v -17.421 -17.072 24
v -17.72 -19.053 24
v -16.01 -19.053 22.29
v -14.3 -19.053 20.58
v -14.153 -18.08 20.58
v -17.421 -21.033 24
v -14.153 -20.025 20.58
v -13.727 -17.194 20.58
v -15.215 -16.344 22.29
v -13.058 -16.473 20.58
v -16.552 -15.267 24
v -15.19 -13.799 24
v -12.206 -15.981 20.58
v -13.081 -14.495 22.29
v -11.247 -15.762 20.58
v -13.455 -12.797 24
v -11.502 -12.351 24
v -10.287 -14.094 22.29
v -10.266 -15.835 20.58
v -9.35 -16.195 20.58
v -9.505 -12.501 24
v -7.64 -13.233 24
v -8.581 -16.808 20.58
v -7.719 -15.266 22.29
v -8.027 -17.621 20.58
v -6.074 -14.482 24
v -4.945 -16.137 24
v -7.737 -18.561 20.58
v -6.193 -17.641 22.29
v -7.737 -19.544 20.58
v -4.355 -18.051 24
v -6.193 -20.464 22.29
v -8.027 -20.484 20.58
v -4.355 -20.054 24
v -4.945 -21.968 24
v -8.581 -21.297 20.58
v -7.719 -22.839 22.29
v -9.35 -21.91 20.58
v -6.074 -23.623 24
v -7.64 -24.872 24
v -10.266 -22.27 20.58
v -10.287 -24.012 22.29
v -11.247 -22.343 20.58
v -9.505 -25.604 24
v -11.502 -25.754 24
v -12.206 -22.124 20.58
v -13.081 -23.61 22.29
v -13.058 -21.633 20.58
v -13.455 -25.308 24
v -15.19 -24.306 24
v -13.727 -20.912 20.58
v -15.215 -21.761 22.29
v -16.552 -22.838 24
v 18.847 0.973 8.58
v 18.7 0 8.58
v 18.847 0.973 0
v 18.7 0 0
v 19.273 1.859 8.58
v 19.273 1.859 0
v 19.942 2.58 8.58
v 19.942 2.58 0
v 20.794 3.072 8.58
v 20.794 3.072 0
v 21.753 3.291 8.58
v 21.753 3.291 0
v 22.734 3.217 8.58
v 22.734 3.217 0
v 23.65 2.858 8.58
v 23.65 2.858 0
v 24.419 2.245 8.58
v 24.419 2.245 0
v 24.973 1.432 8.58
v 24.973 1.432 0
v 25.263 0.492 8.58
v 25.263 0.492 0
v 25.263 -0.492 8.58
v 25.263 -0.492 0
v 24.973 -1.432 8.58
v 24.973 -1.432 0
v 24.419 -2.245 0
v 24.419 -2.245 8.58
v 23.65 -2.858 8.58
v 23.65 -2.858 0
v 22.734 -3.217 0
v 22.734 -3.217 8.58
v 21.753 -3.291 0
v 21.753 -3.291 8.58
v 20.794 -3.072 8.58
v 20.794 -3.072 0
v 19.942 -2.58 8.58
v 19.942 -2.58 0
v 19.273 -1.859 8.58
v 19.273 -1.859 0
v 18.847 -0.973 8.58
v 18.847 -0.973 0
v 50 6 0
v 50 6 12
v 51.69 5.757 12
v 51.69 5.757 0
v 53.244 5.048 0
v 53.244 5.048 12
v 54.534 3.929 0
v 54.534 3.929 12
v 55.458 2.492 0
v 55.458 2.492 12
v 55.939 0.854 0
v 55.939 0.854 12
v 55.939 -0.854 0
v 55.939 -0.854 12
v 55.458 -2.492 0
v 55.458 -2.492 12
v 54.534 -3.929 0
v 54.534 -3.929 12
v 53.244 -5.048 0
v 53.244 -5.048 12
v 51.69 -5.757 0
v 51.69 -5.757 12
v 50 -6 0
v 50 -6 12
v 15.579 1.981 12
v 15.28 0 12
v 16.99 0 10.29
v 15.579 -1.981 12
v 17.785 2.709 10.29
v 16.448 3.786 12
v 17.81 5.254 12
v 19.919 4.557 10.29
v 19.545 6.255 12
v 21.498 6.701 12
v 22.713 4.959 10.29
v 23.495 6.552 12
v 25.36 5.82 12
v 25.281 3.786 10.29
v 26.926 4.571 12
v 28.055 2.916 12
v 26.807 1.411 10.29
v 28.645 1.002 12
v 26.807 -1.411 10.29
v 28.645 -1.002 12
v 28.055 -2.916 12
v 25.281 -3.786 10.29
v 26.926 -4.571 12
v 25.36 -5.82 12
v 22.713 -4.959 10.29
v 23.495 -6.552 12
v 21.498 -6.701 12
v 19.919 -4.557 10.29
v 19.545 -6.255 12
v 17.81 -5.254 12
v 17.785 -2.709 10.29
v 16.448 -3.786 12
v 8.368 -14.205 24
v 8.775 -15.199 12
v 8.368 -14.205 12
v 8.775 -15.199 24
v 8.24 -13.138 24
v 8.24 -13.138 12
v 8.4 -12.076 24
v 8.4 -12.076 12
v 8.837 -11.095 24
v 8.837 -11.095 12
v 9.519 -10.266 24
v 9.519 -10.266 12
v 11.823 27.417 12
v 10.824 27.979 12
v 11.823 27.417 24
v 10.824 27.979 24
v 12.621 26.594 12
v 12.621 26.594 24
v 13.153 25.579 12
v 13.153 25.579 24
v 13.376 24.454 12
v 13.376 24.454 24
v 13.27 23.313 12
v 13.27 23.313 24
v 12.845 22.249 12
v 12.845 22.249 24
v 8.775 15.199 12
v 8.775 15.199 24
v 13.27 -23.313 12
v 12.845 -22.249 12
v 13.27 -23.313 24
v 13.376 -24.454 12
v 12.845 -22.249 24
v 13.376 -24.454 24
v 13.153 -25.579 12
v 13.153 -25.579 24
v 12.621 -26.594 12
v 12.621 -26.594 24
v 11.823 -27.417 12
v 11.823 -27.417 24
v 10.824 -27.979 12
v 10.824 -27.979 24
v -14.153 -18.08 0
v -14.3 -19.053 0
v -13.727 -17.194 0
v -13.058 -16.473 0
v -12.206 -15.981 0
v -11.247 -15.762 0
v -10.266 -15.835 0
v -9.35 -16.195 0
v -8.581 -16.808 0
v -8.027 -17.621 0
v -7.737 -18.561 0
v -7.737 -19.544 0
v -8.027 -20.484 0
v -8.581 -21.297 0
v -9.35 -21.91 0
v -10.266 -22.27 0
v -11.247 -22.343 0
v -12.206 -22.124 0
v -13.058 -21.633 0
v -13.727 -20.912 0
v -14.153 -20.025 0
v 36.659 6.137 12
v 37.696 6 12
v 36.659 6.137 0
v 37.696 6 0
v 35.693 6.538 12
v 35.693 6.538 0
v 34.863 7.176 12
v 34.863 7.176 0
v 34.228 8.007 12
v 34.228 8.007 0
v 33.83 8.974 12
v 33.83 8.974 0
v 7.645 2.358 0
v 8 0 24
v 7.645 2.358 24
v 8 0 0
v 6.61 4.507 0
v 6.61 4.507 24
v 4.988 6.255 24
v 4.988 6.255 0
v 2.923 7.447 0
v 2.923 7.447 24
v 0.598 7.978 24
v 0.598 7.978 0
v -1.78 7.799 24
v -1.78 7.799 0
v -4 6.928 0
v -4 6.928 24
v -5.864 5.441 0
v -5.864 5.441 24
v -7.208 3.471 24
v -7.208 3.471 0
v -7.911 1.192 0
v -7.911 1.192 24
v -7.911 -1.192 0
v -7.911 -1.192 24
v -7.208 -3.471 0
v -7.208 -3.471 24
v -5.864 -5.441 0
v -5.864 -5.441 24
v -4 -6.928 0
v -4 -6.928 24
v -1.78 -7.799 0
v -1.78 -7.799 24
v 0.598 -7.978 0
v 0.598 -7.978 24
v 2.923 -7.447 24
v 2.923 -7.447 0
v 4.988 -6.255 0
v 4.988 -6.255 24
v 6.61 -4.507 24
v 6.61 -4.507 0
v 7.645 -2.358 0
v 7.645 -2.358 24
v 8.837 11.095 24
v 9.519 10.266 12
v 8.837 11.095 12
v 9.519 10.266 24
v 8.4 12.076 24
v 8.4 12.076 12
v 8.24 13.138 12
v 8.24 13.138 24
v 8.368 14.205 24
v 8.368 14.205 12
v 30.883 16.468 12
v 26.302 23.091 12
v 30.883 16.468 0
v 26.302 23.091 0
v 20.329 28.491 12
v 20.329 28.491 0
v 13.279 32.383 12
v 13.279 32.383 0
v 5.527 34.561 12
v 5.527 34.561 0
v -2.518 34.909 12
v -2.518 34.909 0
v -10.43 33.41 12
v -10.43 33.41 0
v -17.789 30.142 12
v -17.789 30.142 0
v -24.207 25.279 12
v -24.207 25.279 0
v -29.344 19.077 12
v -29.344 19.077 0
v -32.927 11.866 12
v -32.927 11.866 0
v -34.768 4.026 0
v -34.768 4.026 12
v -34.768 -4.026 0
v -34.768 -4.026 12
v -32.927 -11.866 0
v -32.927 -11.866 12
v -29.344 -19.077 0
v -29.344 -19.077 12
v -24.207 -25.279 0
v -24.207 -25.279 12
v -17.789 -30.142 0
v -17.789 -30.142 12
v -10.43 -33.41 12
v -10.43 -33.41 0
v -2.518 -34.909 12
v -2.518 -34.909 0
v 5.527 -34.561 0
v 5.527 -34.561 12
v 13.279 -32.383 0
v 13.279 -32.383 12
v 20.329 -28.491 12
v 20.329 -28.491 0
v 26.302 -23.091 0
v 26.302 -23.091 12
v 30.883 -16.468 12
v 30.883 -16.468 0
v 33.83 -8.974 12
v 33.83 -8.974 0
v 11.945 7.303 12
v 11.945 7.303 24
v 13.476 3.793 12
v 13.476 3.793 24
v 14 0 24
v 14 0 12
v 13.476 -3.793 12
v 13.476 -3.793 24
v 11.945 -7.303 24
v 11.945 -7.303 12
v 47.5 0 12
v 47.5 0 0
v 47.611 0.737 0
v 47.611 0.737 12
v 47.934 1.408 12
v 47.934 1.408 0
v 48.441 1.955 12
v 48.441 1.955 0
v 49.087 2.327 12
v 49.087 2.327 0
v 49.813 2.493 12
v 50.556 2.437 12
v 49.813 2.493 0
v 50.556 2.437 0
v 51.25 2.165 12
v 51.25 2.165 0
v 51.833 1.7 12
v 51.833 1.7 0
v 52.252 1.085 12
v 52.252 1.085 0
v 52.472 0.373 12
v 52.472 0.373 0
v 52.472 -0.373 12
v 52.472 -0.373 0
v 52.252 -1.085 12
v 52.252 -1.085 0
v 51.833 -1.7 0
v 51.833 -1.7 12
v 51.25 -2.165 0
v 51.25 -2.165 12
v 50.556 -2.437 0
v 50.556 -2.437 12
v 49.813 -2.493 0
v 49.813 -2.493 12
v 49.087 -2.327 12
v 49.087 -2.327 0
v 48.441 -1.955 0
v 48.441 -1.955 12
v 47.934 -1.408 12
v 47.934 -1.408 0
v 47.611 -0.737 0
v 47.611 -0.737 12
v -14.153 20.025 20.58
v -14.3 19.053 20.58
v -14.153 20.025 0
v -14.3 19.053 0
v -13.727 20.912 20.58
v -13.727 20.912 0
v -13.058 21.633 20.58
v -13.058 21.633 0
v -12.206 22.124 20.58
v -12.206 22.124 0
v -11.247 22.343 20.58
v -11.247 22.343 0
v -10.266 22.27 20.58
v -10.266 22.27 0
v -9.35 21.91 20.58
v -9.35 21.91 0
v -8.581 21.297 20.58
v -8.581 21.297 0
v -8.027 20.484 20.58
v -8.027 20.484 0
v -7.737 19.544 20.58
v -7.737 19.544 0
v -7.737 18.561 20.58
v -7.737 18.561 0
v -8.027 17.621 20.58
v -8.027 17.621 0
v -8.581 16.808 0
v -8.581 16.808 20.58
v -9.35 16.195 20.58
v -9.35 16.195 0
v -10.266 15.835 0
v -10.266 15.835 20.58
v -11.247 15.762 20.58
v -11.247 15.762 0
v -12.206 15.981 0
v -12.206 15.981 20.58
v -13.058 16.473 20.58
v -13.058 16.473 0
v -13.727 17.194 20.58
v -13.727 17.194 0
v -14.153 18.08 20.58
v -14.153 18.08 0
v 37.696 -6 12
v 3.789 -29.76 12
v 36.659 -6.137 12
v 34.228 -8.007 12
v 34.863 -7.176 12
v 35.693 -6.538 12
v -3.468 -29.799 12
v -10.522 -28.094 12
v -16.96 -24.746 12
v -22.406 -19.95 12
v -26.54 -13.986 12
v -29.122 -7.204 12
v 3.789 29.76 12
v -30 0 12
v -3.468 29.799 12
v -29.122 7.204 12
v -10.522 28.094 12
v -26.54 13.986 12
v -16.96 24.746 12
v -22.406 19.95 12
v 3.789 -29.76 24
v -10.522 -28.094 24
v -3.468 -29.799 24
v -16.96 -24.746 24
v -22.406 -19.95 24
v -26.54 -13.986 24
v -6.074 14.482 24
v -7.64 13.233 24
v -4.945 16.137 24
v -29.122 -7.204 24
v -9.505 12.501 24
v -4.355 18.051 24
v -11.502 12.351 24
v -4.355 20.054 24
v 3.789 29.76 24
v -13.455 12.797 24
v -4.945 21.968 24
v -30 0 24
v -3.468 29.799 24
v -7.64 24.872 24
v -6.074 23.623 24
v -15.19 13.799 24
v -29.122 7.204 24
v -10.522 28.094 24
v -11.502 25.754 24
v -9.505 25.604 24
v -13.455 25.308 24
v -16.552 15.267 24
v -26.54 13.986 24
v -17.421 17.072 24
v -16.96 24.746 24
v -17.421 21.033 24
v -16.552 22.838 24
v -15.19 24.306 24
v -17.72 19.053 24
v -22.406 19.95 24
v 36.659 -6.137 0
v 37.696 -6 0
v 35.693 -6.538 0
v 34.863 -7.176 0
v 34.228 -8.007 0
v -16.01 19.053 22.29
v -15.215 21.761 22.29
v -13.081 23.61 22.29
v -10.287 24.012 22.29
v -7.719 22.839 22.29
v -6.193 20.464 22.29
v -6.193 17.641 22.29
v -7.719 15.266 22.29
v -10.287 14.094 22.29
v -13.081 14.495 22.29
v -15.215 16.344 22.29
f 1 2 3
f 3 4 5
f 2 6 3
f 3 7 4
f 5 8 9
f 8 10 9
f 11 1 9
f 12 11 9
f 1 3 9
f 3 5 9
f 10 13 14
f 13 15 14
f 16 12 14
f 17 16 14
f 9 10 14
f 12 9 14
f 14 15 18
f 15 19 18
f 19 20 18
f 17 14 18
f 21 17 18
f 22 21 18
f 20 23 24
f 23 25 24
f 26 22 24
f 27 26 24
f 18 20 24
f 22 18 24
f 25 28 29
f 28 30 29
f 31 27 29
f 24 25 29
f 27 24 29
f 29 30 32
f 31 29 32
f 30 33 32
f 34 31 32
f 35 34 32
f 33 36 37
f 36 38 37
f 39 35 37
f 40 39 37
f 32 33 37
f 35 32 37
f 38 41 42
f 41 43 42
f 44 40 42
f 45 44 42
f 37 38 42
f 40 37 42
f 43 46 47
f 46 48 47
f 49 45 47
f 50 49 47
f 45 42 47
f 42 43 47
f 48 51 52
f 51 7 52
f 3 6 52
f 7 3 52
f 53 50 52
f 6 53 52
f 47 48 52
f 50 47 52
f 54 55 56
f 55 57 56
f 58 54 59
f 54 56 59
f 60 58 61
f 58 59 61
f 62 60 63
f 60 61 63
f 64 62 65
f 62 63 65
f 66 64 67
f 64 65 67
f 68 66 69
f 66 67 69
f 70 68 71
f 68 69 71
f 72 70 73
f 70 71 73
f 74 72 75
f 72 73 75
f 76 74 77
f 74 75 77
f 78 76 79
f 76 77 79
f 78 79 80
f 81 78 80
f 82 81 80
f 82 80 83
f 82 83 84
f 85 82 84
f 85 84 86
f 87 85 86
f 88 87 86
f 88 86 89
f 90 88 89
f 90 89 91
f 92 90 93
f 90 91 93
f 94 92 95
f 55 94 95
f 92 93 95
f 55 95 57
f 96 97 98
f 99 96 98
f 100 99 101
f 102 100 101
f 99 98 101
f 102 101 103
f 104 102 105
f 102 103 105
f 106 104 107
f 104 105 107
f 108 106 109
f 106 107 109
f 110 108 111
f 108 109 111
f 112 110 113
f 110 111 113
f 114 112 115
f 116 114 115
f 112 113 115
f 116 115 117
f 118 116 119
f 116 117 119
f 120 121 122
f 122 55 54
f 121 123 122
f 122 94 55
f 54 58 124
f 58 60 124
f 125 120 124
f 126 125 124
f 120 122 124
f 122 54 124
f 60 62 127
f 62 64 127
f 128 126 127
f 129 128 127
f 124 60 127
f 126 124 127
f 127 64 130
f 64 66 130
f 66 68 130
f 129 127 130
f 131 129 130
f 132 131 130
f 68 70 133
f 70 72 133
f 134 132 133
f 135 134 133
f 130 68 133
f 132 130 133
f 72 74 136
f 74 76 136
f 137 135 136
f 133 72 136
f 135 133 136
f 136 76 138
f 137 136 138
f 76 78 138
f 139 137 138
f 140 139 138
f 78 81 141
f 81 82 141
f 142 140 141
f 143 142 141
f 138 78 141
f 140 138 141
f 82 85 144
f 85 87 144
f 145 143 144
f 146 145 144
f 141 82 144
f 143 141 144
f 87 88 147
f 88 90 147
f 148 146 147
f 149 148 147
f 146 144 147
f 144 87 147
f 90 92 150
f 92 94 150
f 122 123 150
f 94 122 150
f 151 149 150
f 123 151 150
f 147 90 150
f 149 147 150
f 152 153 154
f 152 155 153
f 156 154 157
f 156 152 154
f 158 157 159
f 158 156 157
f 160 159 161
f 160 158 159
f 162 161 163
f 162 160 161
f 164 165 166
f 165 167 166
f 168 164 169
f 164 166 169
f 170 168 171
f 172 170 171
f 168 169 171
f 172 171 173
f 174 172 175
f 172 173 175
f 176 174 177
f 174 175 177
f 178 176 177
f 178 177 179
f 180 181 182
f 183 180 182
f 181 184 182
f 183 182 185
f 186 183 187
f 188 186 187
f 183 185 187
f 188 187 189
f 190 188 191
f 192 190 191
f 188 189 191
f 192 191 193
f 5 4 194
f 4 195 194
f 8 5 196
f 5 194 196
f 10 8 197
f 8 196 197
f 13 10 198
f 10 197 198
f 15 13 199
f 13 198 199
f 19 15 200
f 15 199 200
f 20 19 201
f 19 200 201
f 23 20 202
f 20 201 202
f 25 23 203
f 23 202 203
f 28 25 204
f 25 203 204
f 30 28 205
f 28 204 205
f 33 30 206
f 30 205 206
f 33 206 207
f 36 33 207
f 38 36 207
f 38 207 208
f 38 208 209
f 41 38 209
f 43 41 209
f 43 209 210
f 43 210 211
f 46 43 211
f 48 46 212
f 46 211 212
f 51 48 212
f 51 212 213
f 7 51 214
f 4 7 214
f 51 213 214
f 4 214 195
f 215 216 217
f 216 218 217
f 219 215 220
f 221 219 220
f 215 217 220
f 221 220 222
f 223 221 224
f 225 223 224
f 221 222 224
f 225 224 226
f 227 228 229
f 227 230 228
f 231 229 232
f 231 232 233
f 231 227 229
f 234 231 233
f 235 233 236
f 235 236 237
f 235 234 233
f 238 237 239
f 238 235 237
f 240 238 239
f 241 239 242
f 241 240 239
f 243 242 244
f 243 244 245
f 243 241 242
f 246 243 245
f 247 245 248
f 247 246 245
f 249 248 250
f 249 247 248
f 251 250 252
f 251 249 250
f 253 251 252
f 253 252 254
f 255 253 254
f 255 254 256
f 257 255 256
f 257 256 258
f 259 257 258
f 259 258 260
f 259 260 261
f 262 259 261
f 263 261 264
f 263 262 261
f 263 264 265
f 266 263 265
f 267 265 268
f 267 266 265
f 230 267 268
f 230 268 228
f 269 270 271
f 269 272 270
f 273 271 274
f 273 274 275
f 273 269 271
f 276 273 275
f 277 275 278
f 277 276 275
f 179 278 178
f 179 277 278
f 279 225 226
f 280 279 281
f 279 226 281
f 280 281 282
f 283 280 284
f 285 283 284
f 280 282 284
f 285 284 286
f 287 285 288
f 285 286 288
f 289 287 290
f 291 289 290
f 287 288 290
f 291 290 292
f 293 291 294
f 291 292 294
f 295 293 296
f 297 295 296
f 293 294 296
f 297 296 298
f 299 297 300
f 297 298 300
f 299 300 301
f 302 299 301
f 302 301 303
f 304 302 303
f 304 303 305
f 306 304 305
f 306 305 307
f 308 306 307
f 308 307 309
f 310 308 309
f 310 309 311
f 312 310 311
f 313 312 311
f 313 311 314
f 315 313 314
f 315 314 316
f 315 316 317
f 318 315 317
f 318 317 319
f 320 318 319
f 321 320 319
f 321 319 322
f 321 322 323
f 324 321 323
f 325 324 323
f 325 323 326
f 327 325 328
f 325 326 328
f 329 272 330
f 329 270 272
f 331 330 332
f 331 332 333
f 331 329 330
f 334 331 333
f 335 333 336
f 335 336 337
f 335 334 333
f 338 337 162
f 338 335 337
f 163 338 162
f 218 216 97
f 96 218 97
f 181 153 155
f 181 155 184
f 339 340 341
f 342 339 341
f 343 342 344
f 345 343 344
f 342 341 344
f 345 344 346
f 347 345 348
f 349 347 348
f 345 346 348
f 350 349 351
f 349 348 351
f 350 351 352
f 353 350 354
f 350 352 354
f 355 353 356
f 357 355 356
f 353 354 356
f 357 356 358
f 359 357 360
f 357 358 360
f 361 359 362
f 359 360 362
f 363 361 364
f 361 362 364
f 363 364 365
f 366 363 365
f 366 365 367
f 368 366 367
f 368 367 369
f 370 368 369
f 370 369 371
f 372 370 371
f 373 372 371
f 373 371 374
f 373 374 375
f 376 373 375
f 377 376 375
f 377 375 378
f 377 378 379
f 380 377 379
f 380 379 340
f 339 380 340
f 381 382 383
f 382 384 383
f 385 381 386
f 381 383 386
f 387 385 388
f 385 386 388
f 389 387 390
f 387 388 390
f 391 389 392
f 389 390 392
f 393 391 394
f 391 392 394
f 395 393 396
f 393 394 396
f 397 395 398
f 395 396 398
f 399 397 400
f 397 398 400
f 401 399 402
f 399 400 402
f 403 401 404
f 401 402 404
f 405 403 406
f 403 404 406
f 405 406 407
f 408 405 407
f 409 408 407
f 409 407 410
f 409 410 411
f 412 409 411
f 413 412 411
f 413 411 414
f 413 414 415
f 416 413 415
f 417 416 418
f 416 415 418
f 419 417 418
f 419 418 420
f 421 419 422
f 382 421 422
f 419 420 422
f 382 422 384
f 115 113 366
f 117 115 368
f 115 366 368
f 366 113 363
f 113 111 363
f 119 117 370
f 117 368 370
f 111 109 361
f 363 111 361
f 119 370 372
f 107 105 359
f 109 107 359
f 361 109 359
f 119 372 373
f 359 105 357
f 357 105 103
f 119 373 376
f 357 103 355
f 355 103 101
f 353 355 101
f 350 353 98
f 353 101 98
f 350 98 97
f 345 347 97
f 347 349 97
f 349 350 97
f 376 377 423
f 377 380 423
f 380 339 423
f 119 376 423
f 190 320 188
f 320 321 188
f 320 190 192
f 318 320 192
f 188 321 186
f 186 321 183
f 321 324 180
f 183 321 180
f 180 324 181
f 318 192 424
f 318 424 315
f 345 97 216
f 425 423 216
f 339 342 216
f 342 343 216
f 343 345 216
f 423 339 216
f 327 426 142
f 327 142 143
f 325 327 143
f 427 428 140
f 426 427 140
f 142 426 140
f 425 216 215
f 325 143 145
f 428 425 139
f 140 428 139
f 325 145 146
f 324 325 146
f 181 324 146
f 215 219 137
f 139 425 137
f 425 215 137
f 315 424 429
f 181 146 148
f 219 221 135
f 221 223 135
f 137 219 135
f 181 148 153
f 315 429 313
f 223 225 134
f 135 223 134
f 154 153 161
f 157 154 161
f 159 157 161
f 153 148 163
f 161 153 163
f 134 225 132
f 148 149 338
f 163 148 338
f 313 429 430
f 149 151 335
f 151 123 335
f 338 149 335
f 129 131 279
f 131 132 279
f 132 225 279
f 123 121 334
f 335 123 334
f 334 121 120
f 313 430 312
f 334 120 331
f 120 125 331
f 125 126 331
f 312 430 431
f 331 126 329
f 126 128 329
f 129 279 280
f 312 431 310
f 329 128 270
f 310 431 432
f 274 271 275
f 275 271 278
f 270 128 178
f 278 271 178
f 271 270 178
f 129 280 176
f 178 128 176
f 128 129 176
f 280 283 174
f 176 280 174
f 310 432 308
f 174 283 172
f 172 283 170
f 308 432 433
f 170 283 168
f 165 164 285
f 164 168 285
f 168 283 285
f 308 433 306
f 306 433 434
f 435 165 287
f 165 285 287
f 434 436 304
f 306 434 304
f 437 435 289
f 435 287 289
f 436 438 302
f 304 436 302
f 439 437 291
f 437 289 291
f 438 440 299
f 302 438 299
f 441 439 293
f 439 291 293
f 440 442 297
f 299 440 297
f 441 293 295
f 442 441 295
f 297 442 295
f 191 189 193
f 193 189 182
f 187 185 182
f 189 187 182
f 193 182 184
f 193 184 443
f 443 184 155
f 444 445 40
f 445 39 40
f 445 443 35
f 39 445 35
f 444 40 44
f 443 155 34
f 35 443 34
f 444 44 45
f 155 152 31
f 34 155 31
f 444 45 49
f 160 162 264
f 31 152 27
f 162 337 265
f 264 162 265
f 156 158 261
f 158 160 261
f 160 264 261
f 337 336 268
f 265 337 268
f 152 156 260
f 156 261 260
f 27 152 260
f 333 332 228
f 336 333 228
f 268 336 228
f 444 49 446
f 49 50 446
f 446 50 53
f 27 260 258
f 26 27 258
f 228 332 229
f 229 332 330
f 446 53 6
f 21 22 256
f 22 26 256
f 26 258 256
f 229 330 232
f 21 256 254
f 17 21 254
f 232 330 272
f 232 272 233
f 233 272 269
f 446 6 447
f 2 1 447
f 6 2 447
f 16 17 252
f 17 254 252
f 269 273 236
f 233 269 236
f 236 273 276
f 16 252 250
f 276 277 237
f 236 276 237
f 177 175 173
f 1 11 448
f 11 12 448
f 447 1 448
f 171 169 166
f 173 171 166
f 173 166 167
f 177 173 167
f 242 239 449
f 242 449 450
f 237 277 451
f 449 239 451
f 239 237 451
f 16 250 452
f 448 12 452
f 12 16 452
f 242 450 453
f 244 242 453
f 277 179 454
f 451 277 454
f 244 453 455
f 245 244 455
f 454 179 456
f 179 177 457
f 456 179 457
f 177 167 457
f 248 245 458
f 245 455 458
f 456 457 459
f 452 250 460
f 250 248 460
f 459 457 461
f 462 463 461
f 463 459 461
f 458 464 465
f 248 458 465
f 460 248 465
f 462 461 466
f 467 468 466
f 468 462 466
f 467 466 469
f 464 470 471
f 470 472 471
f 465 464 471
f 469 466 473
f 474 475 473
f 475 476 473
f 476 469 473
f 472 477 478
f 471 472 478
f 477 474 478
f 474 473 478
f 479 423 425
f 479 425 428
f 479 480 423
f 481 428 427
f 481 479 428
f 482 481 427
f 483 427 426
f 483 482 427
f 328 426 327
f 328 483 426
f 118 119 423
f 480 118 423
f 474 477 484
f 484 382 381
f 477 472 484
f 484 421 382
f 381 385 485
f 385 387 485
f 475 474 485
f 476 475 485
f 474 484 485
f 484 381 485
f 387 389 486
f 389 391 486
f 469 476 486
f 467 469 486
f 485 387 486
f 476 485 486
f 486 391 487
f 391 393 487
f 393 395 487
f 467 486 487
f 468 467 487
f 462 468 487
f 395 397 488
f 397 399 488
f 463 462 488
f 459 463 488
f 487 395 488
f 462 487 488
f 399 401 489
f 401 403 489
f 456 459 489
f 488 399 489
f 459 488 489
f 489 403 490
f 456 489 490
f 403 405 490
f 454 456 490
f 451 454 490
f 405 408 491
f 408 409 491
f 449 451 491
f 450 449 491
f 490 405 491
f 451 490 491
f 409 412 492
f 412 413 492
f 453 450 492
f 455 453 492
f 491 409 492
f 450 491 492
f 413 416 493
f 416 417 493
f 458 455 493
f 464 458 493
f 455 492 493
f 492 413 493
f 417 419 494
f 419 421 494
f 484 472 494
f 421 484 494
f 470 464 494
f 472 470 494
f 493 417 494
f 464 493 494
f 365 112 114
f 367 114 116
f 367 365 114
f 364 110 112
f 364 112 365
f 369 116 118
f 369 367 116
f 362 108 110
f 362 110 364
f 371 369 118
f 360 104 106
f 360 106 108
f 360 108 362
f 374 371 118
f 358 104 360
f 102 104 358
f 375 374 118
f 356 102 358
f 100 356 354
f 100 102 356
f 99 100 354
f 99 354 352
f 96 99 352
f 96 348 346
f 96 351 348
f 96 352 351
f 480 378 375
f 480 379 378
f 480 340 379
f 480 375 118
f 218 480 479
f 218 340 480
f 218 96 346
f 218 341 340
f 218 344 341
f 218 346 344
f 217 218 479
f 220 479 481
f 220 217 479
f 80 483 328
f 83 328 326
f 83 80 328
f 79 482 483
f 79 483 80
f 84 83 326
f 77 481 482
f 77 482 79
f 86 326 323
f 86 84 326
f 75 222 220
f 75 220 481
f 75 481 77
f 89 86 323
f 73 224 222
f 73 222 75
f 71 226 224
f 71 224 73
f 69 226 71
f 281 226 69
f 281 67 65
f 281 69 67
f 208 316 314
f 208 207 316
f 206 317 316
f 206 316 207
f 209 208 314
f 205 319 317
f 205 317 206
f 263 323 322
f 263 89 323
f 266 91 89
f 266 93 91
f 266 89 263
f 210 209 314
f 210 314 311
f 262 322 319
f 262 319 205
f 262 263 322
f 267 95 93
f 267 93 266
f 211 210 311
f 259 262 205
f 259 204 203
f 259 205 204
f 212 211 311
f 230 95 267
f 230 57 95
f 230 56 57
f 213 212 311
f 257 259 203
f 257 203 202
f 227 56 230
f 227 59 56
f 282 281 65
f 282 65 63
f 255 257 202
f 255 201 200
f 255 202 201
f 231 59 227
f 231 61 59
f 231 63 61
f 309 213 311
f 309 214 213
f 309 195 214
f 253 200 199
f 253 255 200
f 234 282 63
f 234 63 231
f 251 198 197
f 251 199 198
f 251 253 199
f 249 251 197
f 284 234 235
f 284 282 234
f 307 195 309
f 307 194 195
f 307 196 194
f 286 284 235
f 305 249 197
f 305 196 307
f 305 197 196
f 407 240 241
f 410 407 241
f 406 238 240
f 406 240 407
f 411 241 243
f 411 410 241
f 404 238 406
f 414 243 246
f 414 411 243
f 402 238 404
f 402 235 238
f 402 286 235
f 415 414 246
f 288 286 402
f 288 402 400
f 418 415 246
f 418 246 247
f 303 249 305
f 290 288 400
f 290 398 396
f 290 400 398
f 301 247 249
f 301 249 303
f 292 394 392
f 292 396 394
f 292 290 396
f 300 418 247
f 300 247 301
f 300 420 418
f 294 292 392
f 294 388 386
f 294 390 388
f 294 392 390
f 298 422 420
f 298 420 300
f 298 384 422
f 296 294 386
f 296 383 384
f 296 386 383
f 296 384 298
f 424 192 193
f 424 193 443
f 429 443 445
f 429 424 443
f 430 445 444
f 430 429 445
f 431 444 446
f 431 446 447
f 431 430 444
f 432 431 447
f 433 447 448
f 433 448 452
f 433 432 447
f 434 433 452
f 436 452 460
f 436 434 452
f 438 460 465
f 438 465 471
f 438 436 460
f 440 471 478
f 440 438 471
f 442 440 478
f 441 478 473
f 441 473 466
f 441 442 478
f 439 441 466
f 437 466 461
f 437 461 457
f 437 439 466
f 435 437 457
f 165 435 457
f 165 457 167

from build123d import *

# Parameters (mm, degrees)
SKETCH1_R                                            = 35
SKETCH1_R_2                                          = 8
BOSS_EXTRUDE1_DEPTH                                  = 12
SKETCH2_R                                            = 8
BOSS_EXTRUDE2_DEPTH                                  = 12
BOSS_EXTRUDE3_DEPTH                                  = 12
FILLET1_R                                            = 4
M6_TAPPED_HOLE1_D                                    = 5
CSK_FOR_M6_HEX_SOCKET_COUNTERSUNK_CAP_SC_D           = 6.6
CSK_FOR_M6_HEX_SOCKET_COUNTERSUNK_CAP_SC_CSINK_D     = 13.44
CSK_FOR_M6_HEX_SOCKET_COUNTERSUNK_CAP_SC_CSINK_ANGLE = 90
CSK_FOR_M6_HEX_SOCKET_COUNTERSUNK_CA_2_D             = 6.6
CSK_FOR_M6_HEX_SOCKET_COUNTERSUNK_CA_2_CSINK_D       = 13.44
CSK_FOR_M6_HEX_SOCKET_COUNTERSUNK_CA_2_CSINK_ANGLE   = 90


with BuildPart() as part:
    # Sketch1 → Boss-Extrude1 (new body)
    with BuildSketch(Plane.XY):
        Circle(SKETCH1_R)
        Circle(SKETCH1_R_2, mode=Mode.SUBTRACT)
    extrude(amount=BOSS_EXTRUDE1_DEPTH)

    # Sketch2 → Boss-Extrude2 (add)
    with BuildSketch(Plane.XY.offset(12)):
        with BuildLine():
            Line((15, 25.980762114), (7, 12.124355653))
            ThreePointArc((7, 12.124355653), (14, 0), (7, -12.124355653))
            Line((7, -12.124355653), (15, -25.980762114))
            ThreePointArc((15, -25.980762114), (-30, 0), (15, 25.980762114))
        make_face()
        Circle(SKETCH2_R, mode=Mode.SUBTRACT)
    extrude(amount=BOSS_EXTRUDE2_DEPTH)

    # Sketch5 → Boss-Extrude3 (add)
    with BuildSketch(Plane.XY.offset(12)):
        with BuildLine():
            Line((50, -6), (14, -6))
            ThreePointArc((14, -6), (8, 0), (14, 6))
            Line((14, 6), (50, 6))
            ThreePointArc((50, 6), (56, 0), (50, -6))
        make_face()
    extrude(amount=-BOSS_EXTRUDE3_DEPTH)

    # Fillet1
    fillet1_edges = [part.edges().sort_by_distance(p)[0] for p in [
        (7, -12.124355653, 18),
        (7, 12.124355653, 18),
        (15, 25.980762114, 18),
        (15, -25.980762114, 18),
        (34.481879299, 6, 6),
        (34.481879299, -6, 6),
    ]]
    fillet(fillet1_edges, radius=FILLET1_R)

    # M6 Tapped Hole1 (through all)
    with Locations(Plane.XY.offset(12)):
        with Locations((50, 0)):
            Hole(M6_TAPPED_HOLE1_D / 2)

    # CSK for M6 Hex Socket Countersunk Cap Screw1 (through all)
    with Locations(Plane(origin=(-11, 19.052558883, 24), x_dir=(1, 0, 0), z_dir=(0, 0, 1))):
        with Locations((0, 0), (0, -38.105117766)):
            CounterSinkHole(CSK_FOR_M6_HEX_SOCKET_COUNTERSUNK_CAP_SC_D / 2, CSK_FOR_M6_HEX_SOCKET_COUNTERSUNK_CAP_SC_CSINK_D / 2, counter_sink_angle=CSK_FOR_M6_HEX_SOCKET_COUNTERSUNK_CAP_SC_CSINK_ANGLE)

    # CSK for M6 Hex Socket Countersunk Ca 2 (through all)
    with Locations(Plane(origin=(22, 0, 12), x_dir=(1, 0, 0), z_dir=(0, 0, 1))):
        with Locations((0, 0)):
            CounterSinkHole(CSK_FOR_M6_HEX_SOCKET_COUNTERSUNK_CA_2_D / 2, CSK_FOR_M6_HEX_SOCKET_COUNTERSUNK_CA_2_CSINK_D / 2, counter_sink_angle=CSK_FOR_M6_HEX_SOCKET_COUNTERSUNK_CA_2_CSINK_ANGLE)


solid = part.part
